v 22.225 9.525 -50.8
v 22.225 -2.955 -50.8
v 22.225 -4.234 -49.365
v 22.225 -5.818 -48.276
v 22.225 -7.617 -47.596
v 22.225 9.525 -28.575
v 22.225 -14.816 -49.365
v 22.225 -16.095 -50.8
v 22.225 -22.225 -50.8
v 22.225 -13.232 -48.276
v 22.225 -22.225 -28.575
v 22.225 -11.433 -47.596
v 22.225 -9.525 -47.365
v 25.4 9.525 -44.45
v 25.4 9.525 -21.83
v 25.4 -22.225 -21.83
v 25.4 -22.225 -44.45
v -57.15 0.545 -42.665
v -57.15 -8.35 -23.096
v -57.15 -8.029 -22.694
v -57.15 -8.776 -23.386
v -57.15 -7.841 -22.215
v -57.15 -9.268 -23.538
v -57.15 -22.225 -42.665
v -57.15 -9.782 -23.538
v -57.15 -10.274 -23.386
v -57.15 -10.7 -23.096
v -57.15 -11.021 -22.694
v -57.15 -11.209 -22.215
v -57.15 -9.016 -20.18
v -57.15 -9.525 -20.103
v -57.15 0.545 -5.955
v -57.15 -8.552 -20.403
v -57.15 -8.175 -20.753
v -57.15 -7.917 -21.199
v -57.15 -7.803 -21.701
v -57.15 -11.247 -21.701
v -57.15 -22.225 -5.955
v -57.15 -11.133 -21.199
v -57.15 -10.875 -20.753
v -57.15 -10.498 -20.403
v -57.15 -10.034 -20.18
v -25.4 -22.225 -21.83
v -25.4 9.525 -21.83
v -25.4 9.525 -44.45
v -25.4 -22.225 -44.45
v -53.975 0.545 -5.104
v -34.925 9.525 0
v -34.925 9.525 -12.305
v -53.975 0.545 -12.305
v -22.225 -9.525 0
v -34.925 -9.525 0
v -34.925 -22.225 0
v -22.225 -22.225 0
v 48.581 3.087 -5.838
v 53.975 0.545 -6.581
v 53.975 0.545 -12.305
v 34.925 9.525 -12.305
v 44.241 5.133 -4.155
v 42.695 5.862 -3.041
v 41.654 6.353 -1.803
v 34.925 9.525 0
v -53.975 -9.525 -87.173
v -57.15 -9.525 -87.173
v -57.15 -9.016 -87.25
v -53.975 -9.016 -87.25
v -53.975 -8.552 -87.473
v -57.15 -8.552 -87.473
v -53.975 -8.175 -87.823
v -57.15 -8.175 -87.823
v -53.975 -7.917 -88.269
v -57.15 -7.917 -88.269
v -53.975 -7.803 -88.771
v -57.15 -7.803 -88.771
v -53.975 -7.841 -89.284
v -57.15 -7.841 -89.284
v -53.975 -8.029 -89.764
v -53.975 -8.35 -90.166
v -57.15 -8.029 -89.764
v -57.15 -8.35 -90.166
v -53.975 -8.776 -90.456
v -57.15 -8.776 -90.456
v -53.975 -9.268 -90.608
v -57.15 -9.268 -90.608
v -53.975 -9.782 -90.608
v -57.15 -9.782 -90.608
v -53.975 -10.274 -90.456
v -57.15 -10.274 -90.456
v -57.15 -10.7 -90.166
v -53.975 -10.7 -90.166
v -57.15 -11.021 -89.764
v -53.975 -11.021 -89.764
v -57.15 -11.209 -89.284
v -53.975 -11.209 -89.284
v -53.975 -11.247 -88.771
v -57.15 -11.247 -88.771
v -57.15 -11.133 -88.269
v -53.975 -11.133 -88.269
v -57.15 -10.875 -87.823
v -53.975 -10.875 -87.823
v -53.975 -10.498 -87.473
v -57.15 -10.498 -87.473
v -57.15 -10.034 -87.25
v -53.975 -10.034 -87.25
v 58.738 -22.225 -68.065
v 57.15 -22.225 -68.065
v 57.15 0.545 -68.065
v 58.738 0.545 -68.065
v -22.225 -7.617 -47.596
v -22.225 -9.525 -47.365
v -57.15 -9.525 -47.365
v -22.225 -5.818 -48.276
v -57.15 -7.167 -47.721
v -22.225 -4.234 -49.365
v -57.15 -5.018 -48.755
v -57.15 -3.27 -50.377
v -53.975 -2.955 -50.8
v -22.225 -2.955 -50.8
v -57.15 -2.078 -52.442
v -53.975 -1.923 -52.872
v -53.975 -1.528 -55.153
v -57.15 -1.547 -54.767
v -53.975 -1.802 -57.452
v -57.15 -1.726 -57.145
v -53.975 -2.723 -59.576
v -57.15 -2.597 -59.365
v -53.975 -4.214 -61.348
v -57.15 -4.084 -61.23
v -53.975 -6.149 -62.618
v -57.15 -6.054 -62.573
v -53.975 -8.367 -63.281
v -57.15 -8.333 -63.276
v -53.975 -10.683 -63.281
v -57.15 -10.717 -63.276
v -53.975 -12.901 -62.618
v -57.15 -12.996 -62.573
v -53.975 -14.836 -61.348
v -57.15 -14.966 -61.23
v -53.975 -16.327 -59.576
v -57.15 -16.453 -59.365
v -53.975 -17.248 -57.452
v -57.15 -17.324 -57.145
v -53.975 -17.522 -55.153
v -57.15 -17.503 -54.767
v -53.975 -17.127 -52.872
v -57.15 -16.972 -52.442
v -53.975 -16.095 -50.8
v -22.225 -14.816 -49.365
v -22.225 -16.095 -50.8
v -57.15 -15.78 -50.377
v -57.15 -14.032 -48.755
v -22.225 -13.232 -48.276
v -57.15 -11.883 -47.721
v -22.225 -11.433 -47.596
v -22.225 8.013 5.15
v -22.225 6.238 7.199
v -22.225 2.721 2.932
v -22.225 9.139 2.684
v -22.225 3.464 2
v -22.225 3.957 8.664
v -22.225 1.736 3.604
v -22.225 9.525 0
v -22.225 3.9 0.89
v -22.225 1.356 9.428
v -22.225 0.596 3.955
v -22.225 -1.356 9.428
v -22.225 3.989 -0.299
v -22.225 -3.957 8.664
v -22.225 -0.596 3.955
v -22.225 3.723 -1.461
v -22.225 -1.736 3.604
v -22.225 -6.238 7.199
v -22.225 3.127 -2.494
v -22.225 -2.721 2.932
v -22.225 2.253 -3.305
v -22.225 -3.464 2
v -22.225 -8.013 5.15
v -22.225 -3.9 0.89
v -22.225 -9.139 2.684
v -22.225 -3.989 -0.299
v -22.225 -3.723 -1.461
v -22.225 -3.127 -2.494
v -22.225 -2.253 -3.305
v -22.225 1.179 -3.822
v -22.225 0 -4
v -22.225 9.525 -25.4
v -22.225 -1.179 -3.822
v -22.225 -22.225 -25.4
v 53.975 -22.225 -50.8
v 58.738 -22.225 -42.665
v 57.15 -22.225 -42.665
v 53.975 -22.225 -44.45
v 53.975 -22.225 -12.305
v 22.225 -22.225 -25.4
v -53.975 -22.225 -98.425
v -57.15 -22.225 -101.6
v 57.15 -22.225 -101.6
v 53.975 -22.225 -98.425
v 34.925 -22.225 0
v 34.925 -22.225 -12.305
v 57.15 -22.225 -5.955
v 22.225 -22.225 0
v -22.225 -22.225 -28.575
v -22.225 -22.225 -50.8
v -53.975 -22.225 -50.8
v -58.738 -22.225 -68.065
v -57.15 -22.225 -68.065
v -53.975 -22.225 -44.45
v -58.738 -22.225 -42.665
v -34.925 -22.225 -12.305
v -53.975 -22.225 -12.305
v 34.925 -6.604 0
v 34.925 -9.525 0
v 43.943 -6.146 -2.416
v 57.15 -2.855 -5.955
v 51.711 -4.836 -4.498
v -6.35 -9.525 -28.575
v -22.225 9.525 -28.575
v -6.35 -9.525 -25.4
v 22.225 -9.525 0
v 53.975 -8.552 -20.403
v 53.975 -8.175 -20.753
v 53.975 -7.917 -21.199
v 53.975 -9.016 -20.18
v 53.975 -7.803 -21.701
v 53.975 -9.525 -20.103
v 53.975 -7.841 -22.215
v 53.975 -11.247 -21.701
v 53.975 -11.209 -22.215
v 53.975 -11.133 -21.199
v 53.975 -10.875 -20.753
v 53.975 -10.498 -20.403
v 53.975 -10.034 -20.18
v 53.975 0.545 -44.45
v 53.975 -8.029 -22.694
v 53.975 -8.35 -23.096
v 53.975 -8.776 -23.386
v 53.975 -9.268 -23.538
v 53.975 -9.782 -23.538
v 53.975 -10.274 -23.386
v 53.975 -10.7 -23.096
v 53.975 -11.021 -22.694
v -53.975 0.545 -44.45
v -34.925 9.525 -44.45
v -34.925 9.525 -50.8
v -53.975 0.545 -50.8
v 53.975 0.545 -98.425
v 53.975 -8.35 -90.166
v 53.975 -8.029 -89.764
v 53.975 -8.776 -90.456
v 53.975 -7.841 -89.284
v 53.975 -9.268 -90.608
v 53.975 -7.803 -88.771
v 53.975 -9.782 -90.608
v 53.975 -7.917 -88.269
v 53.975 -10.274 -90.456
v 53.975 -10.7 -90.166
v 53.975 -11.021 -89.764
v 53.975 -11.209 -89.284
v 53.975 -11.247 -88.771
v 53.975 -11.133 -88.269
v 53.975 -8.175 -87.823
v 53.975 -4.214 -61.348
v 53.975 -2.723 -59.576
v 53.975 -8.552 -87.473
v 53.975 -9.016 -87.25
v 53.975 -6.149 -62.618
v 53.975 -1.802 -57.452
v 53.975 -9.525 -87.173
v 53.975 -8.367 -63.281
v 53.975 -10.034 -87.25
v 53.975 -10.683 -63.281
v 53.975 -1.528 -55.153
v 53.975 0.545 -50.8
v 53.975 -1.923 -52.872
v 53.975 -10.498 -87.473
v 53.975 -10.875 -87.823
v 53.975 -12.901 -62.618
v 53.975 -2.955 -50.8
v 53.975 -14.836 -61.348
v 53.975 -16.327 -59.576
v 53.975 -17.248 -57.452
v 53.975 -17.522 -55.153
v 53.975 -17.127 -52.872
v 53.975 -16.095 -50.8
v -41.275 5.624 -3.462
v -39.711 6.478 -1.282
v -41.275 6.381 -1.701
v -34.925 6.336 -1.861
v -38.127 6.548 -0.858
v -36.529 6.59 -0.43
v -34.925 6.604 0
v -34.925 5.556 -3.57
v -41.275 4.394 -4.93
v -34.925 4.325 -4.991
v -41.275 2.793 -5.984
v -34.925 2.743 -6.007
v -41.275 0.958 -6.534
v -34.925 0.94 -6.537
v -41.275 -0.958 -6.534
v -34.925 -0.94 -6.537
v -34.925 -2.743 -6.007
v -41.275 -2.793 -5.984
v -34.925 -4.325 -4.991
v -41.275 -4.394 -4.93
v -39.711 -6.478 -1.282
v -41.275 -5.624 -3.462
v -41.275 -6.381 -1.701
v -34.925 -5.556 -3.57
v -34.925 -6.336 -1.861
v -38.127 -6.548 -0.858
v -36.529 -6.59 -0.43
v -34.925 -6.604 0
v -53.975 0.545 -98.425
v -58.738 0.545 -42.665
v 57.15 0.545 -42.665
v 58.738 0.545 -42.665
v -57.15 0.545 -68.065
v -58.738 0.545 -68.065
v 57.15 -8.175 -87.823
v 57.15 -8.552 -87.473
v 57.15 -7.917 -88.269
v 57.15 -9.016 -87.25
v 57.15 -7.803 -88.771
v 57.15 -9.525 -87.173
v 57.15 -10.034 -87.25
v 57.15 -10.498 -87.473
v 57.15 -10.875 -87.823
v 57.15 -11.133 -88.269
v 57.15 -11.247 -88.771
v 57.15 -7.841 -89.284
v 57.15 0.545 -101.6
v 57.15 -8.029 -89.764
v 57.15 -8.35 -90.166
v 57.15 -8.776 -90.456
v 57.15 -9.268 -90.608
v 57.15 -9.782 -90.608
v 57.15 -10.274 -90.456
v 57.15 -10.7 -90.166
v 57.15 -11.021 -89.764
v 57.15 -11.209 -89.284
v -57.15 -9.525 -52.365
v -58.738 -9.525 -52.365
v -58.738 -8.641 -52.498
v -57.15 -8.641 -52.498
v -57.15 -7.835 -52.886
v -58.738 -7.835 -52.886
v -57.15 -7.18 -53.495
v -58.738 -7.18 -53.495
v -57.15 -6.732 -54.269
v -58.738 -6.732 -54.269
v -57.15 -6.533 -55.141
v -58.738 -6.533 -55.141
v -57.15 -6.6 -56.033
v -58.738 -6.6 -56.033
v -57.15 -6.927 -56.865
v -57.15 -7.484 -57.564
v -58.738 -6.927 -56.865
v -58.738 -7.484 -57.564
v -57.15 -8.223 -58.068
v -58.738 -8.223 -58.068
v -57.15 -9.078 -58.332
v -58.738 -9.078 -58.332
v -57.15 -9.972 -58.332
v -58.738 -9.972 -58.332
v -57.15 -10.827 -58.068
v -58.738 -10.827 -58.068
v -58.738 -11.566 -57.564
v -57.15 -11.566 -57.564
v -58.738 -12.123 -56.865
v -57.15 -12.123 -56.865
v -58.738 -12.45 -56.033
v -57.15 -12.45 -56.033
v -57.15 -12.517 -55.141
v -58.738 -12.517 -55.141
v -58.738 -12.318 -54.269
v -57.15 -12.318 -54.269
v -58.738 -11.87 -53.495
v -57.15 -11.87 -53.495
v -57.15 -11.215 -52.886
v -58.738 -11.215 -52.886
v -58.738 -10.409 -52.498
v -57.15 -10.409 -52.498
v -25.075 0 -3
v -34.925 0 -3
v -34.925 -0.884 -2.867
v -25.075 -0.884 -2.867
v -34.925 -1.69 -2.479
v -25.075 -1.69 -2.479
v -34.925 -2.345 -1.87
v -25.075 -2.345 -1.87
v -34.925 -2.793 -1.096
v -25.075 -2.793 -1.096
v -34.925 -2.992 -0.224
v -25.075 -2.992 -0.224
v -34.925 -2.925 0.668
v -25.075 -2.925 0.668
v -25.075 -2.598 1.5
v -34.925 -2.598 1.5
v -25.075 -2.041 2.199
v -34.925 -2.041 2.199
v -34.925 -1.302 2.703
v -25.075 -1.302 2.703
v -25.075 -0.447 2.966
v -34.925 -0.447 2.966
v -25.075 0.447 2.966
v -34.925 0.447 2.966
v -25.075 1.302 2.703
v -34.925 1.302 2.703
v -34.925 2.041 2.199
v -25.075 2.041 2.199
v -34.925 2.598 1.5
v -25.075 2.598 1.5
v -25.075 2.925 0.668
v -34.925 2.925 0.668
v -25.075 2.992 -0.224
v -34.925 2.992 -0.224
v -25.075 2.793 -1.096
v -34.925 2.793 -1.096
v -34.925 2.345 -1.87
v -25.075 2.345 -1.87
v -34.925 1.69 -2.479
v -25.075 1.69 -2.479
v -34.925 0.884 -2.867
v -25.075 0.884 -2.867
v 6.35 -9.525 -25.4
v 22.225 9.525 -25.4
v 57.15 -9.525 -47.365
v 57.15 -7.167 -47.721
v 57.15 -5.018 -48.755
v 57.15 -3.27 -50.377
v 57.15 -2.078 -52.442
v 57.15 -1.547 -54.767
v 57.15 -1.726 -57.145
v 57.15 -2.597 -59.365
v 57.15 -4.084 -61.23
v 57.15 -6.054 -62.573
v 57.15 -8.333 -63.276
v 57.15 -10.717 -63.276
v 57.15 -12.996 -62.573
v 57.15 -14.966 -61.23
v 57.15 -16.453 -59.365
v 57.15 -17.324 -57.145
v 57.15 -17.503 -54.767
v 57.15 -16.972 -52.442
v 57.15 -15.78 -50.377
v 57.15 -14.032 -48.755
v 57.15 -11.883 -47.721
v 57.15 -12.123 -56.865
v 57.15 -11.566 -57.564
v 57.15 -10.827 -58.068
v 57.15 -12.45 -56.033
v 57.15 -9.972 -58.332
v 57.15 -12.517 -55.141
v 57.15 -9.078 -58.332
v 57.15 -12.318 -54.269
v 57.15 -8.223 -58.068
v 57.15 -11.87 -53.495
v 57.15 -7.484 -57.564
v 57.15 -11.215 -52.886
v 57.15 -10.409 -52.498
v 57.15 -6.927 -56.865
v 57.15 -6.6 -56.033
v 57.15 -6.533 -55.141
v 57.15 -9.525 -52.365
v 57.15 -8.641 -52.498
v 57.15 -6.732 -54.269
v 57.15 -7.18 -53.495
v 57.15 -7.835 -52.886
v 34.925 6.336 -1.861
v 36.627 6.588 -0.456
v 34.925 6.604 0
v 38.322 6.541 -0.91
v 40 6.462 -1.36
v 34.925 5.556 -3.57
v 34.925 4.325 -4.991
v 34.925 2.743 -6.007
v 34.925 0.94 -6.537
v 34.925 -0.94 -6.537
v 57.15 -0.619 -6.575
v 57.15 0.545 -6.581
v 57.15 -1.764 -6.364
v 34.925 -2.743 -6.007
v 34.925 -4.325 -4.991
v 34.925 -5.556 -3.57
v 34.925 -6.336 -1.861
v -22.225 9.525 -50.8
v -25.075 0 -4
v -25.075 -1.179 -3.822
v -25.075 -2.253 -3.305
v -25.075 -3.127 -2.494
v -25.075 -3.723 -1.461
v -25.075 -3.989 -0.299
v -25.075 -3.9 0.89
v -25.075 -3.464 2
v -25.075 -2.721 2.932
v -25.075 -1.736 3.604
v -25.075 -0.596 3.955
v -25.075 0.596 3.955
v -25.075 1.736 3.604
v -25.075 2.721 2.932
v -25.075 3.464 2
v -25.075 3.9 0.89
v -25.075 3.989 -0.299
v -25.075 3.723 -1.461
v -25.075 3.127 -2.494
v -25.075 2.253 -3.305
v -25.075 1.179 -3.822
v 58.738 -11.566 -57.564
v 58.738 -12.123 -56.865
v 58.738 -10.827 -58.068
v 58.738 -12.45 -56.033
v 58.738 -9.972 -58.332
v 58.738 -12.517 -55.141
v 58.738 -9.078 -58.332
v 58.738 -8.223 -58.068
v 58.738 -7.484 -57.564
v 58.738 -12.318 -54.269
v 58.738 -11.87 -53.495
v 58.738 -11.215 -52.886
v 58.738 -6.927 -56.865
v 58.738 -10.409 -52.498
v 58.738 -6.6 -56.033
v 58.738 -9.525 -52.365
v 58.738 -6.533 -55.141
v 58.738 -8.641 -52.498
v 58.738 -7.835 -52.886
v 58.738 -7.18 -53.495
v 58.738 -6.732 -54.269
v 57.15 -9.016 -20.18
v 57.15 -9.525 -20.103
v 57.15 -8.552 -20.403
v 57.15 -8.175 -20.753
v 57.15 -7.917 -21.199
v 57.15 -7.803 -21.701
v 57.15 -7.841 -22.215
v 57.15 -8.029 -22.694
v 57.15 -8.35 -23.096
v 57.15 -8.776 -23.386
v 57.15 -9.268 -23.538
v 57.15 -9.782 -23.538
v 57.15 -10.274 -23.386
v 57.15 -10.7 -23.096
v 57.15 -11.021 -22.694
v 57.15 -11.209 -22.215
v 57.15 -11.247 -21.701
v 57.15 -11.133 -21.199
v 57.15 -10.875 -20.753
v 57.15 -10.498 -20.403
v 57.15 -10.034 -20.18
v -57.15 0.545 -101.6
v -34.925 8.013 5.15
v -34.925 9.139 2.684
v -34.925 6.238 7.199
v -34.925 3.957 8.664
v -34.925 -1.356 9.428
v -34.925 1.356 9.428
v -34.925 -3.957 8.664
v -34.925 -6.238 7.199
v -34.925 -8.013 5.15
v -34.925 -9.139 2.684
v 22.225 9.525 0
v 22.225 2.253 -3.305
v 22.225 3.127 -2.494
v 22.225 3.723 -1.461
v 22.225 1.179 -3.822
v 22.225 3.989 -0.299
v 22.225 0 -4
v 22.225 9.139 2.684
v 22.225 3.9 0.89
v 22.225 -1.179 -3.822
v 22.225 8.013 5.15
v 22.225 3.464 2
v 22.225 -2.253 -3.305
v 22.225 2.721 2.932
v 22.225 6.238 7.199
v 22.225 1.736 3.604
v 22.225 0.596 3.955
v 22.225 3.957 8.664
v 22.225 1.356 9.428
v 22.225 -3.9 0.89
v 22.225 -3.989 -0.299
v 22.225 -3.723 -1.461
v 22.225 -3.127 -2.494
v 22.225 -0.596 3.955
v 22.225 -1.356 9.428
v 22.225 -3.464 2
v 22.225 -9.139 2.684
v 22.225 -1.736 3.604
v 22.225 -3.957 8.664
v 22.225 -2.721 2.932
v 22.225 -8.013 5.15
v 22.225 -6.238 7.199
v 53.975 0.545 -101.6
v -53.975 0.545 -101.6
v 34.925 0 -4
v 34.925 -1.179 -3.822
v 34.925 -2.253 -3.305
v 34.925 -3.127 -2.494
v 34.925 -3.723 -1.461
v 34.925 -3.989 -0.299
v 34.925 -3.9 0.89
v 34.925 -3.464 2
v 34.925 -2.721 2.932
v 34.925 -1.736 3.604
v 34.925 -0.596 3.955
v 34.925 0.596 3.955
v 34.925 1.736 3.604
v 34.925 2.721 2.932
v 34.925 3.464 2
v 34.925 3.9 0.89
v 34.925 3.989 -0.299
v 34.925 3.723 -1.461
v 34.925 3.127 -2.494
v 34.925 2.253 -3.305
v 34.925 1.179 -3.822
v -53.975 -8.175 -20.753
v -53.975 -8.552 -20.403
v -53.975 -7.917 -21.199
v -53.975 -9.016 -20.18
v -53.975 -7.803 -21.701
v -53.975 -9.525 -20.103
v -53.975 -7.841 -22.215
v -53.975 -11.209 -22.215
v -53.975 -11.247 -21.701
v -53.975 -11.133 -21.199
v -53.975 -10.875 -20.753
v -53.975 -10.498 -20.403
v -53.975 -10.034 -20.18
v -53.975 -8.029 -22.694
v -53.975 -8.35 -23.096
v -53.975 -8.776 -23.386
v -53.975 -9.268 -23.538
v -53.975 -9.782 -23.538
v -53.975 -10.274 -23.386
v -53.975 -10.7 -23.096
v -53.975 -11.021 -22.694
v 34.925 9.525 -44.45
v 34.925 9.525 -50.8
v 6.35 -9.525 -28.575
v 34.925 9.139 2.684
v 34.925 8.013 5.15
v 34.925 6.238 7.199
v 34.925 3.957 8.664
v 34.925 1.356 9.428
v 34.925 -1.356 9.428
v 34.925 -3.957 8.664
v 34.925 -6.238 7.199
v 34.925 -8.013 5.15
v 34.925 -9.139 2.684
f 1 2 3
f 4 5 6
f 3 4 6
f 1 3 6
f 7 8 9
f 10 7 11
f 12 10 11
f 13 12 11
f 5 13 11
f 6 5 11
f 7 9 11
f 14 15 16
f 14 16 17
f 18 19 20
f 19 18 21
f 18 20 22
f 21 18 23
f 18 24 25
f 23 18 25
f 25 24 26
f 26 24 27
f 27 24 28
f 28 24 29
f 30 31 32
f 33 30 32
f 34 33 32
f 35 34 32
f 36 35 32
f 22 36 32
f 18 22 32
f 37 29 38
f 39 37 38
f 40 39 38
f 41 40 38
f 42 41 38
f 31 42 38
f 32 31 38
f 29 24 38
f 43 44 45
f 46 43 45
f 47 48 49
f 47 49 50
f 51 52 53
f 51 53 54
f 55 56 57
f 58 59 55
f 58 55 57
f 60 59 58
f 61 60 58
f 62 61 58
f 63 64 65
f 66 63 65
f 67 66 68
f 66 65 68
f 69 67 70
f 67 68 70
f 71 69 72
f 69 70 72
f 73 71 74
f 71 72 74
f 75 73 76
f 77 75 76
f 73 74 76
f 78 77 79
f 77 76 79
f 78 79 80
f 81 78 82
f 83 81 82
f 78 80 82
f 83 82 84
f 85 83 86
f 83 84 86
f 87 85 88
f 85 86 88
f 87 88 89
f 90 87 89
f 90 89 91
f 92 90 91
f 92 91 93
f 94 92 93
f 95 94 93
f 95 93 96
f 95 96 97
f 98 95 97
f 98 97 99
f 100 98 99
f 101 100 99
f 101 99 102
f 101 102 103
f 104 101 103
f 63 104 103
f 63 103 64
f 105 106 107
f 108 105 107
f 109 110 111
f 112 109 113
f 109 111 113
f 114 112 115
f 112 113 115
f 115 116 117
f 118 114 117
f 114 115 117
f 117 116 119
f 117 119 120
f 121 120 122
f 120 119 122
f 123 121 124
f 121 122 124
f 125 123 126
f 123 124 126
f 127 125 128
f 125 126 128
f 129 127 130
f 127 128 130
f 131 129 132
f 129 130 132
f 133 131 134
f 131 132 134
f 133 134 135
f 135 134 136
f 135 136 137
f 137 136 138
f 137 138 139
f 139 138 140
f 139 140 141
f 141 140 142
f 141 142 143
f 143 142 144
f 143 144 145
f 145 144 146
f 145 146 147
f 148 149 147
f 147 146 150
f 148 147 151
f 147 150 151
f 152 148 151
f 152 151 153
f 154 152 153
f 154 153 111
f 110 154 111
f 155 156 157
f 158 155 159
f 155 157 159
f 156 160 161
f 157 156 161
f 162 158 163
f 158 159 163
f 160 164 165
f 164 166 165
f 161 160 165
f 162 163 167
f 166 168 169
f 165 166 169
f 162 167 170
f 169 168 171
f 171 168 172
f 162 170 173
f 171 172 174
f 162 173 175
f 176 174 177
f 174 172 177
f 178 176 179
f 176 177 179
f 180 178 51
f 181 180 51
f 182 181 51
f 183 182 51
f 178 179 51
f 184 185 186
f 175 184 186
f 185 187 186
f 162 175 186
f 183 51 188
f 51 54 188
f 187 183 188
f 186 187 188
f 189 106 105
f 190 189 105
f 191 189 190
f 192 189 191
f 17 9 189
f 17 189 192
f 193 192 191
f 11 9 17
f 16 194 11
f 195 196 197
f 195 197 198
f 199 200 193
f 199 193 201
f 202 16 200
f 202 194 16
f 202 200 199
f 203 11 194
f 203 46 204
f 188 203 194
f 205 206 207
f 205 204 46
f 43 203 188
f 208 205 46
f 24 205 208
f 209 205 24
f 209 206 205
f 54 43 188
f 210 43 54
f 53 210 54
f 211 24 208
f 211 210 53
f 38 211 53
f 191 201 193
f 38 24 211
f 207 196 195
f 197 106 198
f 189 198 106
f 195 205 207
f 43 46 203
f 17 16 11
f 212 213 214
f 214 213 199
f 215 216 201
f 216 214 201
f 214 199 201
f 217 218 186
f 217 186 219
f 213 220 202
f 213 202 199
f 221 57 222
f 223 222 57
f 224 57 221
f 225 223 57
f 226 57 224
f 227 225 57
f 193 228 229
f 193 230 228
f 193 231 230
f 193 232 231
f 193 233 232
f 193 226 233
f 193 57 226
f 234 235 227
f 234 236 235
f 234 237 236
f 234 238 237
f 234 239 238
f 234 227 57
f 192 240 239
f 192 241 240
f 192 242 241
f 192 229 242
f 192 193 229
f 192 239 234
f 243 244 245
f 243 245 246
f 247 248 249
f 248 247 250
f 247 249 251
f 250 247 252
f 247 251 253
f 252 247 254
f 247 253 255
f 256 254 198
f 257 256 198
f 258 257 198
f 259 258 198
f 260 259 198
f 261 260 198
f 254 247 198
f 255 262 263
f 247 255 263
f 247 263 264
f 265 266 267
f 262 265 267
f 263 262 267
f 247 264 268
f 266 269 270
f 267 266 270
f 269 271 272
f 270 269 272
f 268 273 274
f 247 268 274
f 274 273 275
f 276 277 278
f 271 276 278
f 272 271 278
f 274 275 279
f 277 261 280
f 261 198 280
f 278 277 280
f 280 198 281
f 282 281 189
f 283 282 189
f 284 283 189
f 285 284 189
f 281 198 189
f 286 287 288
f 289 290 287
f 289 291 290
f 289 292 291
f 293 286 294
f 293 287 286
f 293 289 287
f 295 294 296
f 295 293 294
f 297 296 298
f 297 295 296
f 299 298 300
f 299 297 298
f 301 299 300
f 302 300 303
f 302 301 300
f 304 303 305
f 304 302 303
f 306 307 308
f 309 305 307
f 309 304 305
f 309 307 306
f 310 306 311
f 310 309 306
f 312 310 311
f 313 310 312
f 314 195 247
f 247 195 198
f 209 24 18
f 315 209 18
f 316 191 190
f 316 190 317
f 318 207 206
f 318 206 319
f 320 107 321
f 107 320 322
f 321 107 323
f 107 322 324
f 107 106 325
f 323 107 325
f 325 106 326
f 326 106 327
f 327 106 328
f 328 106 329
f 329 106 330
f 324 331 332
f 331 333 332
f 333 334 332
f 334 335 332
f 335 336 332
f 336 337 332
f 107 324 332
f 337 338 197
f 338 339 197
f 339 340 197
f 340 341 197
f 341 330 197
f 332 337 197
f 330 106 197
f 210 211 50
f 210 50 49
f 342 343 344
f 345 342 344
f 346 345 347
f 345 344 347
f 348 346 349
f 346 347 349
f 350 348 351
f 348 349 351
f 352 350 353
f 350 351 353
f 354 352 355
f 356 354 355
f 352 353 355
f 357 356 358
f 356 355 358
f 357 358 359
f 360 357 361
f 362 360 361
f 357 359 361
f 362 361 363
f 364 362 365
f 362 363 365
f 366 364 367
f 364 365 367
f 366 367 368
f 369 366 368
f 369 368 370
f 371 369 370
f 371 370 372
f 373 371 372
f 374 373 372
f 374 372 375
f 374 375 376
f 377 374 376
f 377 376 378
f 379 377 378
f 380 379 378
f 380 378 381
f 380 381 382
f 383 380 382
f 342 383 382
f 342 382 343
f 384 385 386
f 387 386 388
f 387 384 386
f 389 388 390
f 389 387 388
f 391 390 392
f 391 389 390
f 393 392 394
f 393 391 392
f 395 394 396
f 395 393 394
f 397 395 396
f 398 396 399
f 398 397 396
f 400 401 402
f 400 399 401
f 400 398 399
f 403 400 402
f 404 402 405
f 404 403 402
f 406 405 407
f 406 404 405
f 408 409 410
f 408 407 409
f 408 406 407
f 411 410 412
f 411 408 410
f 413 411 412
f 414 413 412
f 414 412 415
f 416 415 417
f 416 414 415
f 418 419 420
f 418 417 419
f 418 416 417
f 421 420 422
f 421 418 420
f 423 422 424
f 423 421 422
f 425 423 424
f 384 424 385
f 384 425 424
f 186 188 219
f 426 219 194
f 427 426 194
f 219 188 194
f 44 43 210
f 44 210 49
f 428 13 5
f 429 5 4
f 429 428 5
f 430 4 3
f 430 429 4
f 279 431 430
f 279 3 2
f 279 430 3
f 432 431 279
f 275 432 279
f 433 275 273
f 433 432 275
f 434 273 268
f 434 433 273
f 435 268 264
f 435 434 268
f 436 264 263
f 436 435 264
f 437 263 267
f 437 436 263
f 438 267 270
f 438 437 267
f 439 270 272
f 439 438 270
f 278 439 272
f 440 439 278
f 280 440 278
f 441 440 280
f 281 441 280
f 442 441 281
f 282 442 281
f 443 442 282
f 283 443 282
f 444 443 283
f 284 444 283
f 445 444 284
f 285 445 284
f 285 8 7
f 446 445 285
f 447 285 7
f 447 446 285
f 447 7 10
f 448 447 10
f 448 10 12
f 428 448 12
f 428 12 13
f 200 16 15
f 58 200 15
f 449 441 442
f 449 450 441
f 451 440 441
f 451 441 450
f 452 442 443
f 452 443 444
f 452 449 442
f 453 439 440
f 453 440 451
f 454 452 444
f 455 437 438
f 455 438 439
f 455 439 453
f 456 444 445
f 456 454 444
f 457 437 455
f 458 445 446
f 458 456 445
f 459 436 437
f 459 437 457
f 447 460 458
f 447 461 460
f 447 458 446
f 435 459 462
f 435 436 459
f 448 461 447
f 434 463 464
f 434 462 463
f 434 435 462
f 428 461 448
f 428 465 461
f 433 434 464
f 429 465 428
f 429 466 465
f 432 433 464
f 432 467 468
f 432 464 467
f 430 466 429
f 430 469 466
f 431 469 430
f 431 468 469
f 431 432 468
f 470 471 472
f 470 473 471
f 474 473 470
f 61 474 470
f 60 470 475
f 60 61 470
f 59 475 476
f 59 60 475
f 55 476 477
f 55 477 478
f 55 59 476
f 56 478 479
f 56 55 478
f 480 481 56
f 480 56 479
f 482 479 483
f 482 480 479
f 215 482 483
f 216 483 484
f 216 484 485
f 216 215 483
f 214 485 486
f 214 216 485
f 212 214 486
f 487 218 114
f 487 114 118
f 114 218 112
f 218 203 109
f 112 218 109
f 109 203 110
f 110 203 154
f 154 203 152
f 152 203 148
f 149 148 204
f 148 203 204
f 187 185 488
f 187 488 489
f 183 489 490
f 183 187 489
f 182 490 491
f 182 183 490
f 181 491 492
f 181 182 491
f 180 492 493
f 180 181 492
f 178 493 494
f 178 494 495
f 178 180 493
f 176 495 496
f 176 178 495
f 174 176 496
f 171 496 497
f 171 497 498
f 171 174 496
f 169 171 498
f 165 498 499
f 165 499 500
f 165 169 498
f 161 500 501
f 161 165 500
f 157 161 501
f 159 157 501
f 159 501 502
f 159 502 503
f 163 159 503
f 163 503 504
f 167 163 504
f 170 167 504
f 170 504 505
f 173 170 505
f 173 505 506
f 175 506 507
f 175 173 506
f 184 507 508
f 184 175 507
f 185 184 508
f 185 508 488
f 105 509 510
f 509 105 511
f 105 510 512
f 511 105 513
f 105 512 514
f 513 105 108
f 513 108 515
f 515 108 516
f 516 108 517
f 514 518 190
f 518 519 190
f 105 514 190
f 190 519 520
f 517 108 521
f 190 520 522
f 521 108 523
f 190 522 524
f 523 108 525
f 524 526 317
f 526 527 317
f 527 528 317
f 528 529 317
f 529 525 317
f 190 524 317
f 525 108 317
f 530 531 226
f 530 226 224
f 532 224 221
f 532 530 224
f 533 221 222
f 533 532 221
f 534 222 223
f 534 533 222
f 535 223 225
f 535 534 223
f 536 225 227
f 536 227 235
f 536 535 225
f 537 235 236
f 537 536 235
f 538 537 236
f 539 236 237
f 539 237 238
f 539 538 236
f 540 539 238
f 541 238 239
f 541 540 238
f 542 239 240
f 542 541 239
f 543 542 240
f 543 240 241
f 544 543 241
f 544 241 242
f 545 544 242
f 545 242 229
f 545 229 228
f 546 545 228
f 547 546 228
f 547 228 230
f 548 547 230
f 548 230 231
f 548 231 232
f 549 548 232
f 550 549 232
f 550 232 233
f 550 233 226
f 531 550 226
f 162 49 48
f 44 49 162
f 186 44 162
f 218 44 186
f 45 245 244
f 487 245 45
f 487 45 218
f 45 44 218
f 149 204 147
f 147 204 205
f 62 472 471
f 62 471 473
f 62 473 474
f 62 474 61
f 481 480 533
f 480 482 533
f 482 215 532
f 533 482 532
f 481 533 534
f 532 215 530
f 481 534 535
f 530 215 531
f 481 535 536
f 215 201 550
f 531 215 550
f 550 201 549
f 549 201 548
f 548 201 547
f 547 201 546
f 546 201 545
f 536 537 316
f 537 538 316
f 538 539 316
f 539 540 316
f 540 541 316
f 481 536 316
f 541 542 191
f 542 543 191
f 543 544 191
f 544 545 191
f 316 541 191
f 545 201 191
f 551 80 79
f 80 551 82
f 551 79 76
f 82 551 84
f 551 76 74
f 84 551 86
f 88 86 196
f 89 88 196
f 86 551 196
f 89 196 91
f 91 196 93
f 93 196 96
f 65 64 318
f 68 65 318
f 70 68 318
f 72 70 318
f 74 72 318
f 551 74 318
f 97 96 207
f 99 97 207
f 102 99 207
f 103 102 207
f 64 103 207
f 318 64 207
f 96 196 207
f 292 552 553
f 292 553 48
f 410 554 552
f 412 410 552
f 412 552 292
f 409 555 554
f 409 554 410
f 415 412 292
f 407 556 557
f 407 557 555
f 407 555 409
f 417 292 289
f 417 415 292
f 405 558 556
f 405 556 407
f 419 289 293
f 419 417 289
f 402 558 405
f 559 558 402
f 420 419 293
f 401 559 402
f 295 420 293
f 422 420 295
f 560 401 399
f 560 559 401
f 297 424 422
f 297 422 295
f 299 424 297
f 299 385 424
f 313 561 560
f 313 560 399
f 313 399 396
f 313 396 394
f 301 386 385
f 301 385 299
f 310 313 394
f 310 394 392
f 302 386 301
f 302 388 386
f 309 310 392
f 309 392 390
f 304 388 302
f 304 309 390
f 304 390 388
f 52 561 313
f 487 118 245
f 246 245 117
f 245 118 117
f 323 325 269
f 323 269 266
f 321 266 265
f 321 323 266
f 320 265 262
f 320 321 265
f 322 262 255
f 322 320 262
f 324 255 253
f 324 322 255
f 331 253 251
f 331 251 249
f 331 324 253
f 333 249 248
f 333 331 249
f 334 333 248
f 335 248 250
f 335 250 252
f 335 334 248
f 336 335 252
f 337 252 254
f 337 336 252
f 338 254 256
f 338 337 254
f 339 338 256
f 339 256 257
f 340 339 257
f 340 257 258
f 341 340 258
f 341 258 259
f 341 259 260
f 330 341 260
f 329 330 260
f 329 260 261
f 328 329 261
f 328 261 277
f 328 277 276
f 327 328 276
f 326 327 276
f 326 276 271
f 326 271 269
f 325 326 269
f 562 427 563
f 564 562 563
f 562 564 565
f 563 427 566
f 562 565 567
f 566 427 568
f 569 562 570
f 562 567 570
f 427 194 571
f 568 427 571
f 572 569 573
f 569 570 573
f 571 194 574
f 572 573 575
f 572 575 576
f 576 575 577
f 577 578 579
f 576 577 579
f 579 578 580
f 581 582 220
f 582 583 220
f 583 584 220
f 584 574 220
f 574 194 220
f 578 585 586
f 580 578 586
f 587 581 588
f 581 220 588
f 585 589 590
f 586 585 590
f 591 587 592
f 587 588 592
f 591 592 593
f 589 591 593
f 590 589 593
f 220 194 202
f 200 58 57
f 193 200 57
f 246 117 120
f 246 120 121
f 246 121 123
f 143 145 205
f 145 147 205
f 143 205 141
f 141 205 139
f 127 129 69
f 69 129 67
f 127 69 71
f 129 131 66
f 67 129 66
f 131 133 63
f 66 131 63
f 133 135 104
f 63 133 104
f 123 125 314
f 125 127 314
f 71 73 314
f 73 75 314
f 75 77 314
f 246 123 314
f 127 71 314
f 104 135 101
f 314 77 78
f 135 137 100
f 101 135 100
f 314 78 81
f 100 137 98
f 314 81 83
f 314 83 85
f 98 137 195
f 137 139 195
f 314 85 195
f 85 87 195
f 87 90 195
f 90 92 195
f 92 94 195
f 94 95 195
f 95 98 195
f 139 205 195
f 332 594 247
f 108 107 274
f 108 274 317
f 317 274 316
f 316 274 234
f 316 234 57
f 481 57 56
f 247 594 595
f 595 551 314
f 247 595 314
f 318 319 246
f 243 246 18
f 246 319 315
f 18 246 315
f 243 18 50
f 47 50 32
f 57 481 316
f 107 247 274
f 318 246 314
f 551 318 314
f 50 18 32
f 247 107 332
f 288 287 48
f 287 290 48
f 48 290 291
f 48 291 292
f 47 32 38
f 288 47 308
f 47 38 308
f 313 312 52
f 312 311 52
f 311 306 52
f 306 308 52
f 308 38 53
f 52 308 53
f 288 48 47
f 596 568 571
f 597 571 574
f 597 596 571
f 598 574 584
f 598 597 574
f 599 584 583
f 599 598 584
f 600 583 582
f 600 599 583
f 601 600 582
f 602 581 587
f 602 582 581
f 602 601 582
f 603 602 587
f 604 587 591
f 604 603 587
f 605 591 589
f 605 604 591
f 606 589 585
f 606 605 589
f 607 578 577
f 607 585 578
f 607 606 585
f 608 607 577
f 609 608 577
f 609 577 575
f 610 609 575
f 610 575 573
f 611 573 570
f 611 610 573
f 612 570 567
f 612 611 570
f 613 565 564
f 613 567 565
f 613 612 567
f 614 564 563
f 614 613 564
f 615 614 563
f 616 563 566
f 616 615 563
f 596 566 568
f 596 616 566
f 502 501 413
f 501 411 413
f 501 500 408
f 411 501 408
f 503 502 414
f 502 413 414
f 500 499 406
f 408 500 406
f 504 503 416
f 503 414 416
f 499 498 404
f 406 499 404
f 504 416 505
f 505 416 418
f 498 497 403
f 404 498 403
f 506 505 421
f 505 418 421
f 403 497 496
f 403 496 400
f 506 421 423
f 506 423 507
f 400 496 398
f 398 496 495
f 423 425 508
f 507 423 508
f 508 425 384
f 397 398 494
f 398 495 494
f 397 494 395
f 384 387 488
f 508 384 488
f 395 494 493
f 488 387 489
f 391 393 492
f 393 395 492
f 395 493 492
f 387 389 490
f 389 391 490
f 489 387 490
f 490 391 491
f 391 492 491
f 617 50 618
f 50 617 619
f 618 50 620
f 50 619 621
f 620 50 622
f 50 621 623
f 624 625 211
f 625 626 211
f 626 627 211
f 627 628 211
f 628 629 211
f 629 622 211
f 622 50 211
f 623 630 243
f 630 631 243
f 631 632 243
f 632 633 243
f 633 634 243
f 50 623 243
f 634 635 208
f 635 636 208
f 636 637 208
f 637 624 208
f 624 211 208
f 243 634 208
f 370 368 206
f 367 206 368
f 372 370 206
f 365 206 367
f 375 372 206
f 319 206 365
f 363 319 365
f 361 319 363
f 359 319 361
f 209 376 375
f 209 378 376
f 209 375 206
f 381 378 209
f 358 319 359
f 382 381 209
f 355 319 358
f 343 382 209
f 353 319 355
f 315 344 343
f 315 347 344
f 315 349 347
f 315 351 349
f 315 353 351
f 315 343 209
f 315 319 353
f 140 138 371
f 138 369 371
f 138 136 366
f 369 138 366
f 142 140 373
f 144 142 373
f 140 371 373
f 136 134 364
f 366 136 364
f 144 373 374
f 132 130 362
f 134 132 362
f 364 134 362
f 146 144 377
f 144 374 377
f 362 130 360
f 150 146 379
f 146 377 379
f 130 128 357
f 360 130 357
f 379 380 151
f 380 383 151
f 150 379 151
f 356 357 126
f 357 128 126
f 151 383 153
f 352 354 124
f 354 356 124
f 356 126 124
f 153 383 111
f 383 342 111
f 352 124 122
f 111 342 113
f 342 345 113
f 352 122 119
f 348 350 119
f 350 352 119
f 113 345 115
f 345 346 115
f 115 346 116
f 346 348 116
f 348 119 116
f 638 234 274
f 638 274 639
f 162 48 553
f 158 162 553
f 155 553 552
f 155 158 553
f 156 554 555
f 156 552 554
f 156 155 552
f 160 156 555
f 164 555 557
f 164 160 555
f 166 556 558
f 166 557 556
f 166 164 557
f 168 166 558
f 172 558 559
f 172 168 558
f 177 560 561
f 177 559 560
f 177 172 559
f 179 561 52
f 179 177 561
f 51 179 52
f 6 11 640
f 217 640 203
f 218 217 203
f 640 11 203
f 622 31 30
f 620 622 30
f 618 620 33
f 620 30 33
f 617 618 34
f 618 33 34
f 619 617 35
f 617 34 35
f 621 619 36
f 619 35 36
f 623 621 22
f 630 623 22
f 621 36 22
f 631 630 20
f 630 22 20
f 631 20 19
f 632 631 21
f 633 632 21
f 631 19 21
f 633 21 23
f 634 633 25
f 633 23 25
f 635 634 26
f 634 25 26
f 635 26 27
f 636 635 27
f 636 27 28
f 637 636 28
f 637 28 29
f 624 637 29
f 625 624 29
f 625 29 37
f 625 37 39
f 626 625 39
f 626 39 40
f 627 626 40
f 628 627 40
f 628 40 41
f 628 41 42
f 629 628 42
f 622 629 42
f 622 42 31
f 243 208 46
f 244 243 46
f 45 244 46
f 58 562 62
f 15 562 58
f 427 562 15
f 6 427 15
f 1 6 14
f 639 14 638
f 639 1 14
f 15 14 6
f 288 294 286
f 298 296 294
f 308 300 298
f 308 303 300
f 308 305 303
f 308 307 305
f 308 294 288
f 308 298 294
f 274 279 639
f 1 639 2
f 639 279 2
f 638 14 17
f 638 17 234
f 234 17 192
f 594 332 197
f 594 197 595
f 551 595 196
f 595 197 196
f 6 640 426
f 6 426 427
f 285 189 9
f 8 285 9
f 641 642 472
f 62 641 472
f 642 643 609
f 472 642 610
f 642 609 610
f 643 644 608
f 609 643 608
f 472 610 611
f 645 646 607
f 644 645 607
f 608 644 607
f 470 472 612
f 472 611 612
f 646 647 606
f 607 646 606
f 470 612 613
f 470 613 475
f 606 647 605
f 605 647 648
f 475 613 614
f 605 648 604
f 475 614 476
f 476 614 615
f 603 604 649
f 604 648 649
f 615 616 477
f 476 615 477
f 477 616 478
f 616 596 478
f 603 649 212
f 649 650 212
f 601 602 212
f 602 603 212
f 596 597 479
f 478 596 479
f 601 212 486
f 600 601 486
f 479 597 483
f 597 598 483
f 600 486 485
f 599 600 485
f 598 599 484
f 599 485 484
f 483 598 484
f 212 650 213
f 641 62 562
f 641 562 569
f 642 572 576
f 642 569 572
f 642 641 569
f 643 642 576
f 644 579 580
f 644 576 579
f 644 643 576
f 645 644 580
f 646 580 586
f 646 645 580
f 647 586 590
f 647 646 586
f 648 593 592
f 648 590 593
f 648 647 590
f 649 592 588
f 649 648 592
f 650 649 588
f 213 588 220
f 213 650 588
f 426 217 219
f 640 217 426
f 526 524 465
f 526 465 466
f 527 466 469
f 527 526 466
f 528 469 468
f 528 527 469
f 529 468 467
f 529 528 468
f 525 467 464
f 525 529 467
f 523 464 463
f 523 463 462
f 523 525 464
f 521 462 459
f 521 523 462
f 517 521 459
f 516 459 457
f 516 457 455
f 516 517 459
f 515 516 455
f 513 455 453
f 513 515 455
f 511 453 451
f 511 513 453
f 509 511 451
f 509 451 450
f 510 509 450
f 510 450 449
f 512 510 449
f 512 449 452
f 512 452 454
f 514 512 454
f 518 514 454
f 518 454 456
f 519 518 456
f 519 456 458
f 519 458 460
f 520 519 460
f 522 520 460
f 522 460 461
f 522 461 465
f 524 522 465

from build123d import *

# Parameters (mm, degrees)
SKETCH1_W                = 12.7
SKETCH1_H                = 9.525
BOSS_EXTRUDE1_DEPTH      = 9.525
BOSS_EXTRUDE1_DEPTH_BACK = 22.225
SKETCH2_W                = 28.575
SKETCH2_H                = 32.144829198
CUT_EXTRUDE1_DEPTH       = 127.92060018
CUT_EXTRUDE1_DEPTH_BACK  = 127.92060018
CHAMFER1_SIZE            = 9.525
SKETCH11_W               = 143.179068554
SKETCH11_H               = 12.488767135
CUT_EXTRUDE5_DEPTH       = 119.773497618
SKETCH5_W                = 9.85
SKETCH5_H                = 3
SKETCH5_W_2              = 60
SKETCH5_H_2              = 4
CUT_EXTRUDE3_REACH       = 156.535
SKETCH6_R                = 1.7272
SKETCH6_R_2              = 8
SKETCH7_W                = 25.4
SKETCH7_H                = 22.769743879
BOSS_EXTRUDE2_DEPTH      = 1.5875
CUT_EXTRUDE4_REACH       = 157.713
SKETCH8_R                = 3
CUT_EXTRUDE6_DEPTH       = 99.74454178
CUT_EXTRUDE6_DEPTH_BACK  = 12.7


with BuildPart() as part:
    # Sketch1 → Revolve1 (revolve)
    with BuildSketch(Plane.XY, mode=Mode.PRIVATE) as revolve1_sk:
        with Locations((-28.575, 4.7625)):
            Rectangle(SKETCH1_W, SKETCH1_H)
        with Locations((28.575, 4.7625)):
            Rectangle(SKETCH1_W, SKETCH1_H)
    revolve(revolve1_sk.sketch.rotate(Axis((-22.225, 0, 0), (1, 0, 0)), 90), axis=Axis((-22.225, 0, 0), (1, 0, 0)))

    # Sketch2 → Boss-Extrude1 (add, two sides: drawn at the far end of the back side and taken through both)
    with BuildSketch(Plane(origin=(0, 0, 0), x_dir=(1, 0, 0), z_dir=(0, 1, 0)).offset(-BOSS_EXTRUDE1_DEPTH_BACK)):
        Polygon((-57.15, 5.955170802), (-34.925, 0), (-22.225, 0), (-22.225, 25.4), (22.225, 25.4), (22.225, 0), (34.925, 0), (57.15, 5.955170802), (57.15, 101.6), (-57.15, 101.6), align=None)
        Polygon((-22.225, 28.575), (-22.225, 50.8), (-53.975, 50.8), (-53.975, 98.425), (53.975, 98.425), (53.975, 50.8), (22.225, 50.8), (22.225, 28.575), align=None, mode=Mode.SUBTRACT)
        with Locations((39.6875, 28.377585401)):
            Rectangle(SKETCH2_W, SKETCH2_H, mode=Mode.SUBTRACT)
        with Locations((-39.6875, 28.377585401)):
            Rectangle(SKETCH2_W, SKETCH2_H, mode=Mode.SUBTRACT)
    extrude(amount=BOSS_EXTRUDE1_DEPTH + BOSS_EXTRUDE1_DEPTH_BACK)

    # Sketch3 → Cut-Extrude1 (cut, two sides: drawn at the far end of the back side and taken through both)
    with BuildSketch(Plane(origin=(0, 0, -101.6), x_dir=(-1, 0, 0), z_dir=(0, 0, -1)).offset(-CUT_EXTRUDE1_DEPTH_BACK)):
        Polygon((-363.181758486, 0.544743879), (-78.360804047, 0.544743879), (-53.975, 0.544743879), (-34.925, 9.525), (34.925, 9.525), (53.975, 0.544743879), (73.137213101, 0.544743879), (357.958167541, 0.544743879), (357.958167541, 570.186652758), (-363.181758486, 570.186652758), align=None)
    extrude(amount=CUT_EXTRUDE1_DEPTH + CUT_EXTRUDE1_DEPTH_BACK, mode=Mode.SUBTRACT)

    # Chamfer1
    chamfer1_edges = [part.edges().sort_by_distance(p)[0] for p in [
        (-25.4, -6.35, -12.305170802),
        (25.4, -6.35, -12.305170802),
    ]]
    chamfer(chamfer1_edges, length=CHAMFER1_SIZE)

    # Sketch11 → Cut-Extrude5 (cut, through all)
    with BuildSketch(Plane(origin=(0, 0.544743879, 0), x_dir=(1, 0, 0), z_dir=(0, 1, 0))):
        with Locations((14.439534277, 95.355616432)):
            Rectangle(SKETCH11_W, SKETCH11_H)
    extrude(amount=CUT_EXTRUDE5_DEPTH, mode=Mode.SUBTRACT)

    # Sketch5 → Cut-Revolve1 (revolve, cut)
    with BuildSketch(Plane(origin=(0, 0, 0), x_dir=(1, 0, 0), z_dir=(0, 1, 0)), mode=Mode.PRIVATE) as cut_revolve1_sk:
        Polygon((-34.925, -3), (-34.925, 0), (-41.275, 0), (-41.275, -6.604), (-34.925, -6.604), align=None)
        with Locations((-30, -1.5)):
            Rectangle(SKETCH5_W, SKETCH5_H)
        Polygon((73.349668225, 0), (34.925, 0), (34.925, -4), (34.925, -6.604), (73.349668225, -6.604), align=None)
        with Locations((4.925, -2)):
            Rectangle(SKETCH5_W_2, SKETCH5_H_2)
    revolve(cut_revolve1_sk.sketch.rotate(Axis((116.428907087, 0, 0), (-1, 0, 0)), 180), axis=Axis((116.428907087, 0, 0), (-1, 0, 0)), mode=Mode.SUBTRACT)

    # Sketch6 → Cut-Extrude3 (cut, up to next)
    with BuildSketch(Plane.ZY.offset(57.15), mode=Mode.PRIVATE) as cut_extrude3_sk1:
        with Locations((-88.9, -9.525)):
            Circle(SKETCH6_R)
    cut_extrude3_tool1 = extrude(cut_extrude3_sk1.sketch, amount=-CUT_EXTRUDE3_REACH, mode=Mode.PRIVATE) & part.part
    # Sketch6 → Cut-Extrude3 (cut, up to next)
    with BuildSketch(Plane.ZY.offset(57.15), mode=Mode.PRIVATE) as cut_extrude3_sk2:
        with Locations((-21.830170802, -9.525)):
            Circle(SKETCH6_R)
    cut_extrude3_tool2 = extrude(cut_extrude3_sk2.sketch, amount=-CUT_EXTRUDE3_REACH, mode=Mode.PRIVATE) & part.part
    # Sketch6 → Cut-Extrude3 (cut, up to next)
    with BuildSketch(Plane.ZY.offset(57.15), mode=Mode.PRIVATE) as cut_extrude3_sk3:
        with Locations((-55.365085401, -9.525)):
            Circle(SKETCH6_R_2)
    cut_extrude3_tool3 = extrude(cut_extrude3_sk3.sketch, amount=-CUT_EXTRUDE3_REACH, mode=Mode.PRIVATE) & part.part
    cut_extrude3_1 = cut_extrude3_tool1.solids().sort_by_distance((-57.15, -9.525, -88.9))[0]
    add(cut_extrude3_1, mode=Mode.SUBTRACT)
    cut_extrude3_2 = cut_extrude3_tool2.solids().sort_by_distance((-57.15, -9.525, -21.830171))[0]
    add(cut_extrude3_2, mode=Mode.SUBTRACT)
    cut_extrude3_3 = cut_extrude3_tool3.solids().sort_by_distance((-57.15, -9.525, -55.365085))[0]
    add(cut_extrude3_3, mode=Mode.SUBTRACT)
    cut_extrude3 = cut_extrude3_1 + cut_extrude3_2 + cut_extrude3_3  # Cut-Extrude3 as one shape, for the pattern or mirror that repeats it

    # Sketch7 → Boss-Extrude2 (add)
    with BuildSketch(Plane.ZY.offset(57.15)):
        with Locations((-55.365085401, -10.840128061)):
            Rectangle(SKETCH7_W, SKETCH7_H)
    boss_extrude2 = extrude(amount=BOSS_EXTRUDE2_DEPTH)

    # Sketch8 → Cut-Extrude4 (cut, up to next)
    with BuildSketch(Plane.ZY.offset(58.7375), mode=Mode.PRIVATE) as cut_extrude4_sk1:
        with Locations((-55.365085401, -9.525)):
            Circle(SKETCH8_R)
    cut_extrude4_tool1 = extrude(cut_extrude4_sk1.sketch, amount=-CUT_EXTRUDE4_REACH, mode=Mode.PRIVATE) & part.part
    cut_extrude4 = cut_extrude4_tool1.solids().sort_by_distance((-58.7375, -9.525, -55.365085))[0]
    add(cut_extrude4, mode=Mode.SUBTRACT)

    # Mirror1: Cut-Extrude3, Boss-Extrude2, Cut-Extrude4 across plane
    add(cut_extrude3.mirror(Plane(origin=(0, 0, 0), x_dir=(0, 0, 1), z_dir=(1, 0, 0))), mode=Mode.SUBTRACT)
    add(boss_extrude2.mirror(Plane(origin=(0, 0, 0), x_dir=(0, 0, 1), z_dir=(1, 0, 0))))
    add(cut_extrude4.mirror(Plane(origin=(0, 0, 0), x_dir=(0, 0, 1), z_dir=(1, 0, 0))), mode=Mode.SUBTRACT)

    # Sketch12 → Cut-Extrude6 (cut, two sides: drawn at the far end of the back side and taken through both)
    with BuildSketch(Plane.XY.offset(-25.4).offset(-CUT_EXTRUDE6_DEPTH_BACK)):
        Polygon((-139.974688472, 150.824626166), (-22.225, 9.525), (-6.35, -9.525), (6.35, -9.525), (22.225, 9.525), (139.974688472, 150.824626166), (139.974688472, 518.686412656), (-139.974688472, 518.686412656), align=None)
    extrude(amount=CUT_EXTRUDE6_DEPTH + CUT_EXTRUDE6_DEPTH_BACK, mode=Mode.SUBTRACT)


solid = part.part
